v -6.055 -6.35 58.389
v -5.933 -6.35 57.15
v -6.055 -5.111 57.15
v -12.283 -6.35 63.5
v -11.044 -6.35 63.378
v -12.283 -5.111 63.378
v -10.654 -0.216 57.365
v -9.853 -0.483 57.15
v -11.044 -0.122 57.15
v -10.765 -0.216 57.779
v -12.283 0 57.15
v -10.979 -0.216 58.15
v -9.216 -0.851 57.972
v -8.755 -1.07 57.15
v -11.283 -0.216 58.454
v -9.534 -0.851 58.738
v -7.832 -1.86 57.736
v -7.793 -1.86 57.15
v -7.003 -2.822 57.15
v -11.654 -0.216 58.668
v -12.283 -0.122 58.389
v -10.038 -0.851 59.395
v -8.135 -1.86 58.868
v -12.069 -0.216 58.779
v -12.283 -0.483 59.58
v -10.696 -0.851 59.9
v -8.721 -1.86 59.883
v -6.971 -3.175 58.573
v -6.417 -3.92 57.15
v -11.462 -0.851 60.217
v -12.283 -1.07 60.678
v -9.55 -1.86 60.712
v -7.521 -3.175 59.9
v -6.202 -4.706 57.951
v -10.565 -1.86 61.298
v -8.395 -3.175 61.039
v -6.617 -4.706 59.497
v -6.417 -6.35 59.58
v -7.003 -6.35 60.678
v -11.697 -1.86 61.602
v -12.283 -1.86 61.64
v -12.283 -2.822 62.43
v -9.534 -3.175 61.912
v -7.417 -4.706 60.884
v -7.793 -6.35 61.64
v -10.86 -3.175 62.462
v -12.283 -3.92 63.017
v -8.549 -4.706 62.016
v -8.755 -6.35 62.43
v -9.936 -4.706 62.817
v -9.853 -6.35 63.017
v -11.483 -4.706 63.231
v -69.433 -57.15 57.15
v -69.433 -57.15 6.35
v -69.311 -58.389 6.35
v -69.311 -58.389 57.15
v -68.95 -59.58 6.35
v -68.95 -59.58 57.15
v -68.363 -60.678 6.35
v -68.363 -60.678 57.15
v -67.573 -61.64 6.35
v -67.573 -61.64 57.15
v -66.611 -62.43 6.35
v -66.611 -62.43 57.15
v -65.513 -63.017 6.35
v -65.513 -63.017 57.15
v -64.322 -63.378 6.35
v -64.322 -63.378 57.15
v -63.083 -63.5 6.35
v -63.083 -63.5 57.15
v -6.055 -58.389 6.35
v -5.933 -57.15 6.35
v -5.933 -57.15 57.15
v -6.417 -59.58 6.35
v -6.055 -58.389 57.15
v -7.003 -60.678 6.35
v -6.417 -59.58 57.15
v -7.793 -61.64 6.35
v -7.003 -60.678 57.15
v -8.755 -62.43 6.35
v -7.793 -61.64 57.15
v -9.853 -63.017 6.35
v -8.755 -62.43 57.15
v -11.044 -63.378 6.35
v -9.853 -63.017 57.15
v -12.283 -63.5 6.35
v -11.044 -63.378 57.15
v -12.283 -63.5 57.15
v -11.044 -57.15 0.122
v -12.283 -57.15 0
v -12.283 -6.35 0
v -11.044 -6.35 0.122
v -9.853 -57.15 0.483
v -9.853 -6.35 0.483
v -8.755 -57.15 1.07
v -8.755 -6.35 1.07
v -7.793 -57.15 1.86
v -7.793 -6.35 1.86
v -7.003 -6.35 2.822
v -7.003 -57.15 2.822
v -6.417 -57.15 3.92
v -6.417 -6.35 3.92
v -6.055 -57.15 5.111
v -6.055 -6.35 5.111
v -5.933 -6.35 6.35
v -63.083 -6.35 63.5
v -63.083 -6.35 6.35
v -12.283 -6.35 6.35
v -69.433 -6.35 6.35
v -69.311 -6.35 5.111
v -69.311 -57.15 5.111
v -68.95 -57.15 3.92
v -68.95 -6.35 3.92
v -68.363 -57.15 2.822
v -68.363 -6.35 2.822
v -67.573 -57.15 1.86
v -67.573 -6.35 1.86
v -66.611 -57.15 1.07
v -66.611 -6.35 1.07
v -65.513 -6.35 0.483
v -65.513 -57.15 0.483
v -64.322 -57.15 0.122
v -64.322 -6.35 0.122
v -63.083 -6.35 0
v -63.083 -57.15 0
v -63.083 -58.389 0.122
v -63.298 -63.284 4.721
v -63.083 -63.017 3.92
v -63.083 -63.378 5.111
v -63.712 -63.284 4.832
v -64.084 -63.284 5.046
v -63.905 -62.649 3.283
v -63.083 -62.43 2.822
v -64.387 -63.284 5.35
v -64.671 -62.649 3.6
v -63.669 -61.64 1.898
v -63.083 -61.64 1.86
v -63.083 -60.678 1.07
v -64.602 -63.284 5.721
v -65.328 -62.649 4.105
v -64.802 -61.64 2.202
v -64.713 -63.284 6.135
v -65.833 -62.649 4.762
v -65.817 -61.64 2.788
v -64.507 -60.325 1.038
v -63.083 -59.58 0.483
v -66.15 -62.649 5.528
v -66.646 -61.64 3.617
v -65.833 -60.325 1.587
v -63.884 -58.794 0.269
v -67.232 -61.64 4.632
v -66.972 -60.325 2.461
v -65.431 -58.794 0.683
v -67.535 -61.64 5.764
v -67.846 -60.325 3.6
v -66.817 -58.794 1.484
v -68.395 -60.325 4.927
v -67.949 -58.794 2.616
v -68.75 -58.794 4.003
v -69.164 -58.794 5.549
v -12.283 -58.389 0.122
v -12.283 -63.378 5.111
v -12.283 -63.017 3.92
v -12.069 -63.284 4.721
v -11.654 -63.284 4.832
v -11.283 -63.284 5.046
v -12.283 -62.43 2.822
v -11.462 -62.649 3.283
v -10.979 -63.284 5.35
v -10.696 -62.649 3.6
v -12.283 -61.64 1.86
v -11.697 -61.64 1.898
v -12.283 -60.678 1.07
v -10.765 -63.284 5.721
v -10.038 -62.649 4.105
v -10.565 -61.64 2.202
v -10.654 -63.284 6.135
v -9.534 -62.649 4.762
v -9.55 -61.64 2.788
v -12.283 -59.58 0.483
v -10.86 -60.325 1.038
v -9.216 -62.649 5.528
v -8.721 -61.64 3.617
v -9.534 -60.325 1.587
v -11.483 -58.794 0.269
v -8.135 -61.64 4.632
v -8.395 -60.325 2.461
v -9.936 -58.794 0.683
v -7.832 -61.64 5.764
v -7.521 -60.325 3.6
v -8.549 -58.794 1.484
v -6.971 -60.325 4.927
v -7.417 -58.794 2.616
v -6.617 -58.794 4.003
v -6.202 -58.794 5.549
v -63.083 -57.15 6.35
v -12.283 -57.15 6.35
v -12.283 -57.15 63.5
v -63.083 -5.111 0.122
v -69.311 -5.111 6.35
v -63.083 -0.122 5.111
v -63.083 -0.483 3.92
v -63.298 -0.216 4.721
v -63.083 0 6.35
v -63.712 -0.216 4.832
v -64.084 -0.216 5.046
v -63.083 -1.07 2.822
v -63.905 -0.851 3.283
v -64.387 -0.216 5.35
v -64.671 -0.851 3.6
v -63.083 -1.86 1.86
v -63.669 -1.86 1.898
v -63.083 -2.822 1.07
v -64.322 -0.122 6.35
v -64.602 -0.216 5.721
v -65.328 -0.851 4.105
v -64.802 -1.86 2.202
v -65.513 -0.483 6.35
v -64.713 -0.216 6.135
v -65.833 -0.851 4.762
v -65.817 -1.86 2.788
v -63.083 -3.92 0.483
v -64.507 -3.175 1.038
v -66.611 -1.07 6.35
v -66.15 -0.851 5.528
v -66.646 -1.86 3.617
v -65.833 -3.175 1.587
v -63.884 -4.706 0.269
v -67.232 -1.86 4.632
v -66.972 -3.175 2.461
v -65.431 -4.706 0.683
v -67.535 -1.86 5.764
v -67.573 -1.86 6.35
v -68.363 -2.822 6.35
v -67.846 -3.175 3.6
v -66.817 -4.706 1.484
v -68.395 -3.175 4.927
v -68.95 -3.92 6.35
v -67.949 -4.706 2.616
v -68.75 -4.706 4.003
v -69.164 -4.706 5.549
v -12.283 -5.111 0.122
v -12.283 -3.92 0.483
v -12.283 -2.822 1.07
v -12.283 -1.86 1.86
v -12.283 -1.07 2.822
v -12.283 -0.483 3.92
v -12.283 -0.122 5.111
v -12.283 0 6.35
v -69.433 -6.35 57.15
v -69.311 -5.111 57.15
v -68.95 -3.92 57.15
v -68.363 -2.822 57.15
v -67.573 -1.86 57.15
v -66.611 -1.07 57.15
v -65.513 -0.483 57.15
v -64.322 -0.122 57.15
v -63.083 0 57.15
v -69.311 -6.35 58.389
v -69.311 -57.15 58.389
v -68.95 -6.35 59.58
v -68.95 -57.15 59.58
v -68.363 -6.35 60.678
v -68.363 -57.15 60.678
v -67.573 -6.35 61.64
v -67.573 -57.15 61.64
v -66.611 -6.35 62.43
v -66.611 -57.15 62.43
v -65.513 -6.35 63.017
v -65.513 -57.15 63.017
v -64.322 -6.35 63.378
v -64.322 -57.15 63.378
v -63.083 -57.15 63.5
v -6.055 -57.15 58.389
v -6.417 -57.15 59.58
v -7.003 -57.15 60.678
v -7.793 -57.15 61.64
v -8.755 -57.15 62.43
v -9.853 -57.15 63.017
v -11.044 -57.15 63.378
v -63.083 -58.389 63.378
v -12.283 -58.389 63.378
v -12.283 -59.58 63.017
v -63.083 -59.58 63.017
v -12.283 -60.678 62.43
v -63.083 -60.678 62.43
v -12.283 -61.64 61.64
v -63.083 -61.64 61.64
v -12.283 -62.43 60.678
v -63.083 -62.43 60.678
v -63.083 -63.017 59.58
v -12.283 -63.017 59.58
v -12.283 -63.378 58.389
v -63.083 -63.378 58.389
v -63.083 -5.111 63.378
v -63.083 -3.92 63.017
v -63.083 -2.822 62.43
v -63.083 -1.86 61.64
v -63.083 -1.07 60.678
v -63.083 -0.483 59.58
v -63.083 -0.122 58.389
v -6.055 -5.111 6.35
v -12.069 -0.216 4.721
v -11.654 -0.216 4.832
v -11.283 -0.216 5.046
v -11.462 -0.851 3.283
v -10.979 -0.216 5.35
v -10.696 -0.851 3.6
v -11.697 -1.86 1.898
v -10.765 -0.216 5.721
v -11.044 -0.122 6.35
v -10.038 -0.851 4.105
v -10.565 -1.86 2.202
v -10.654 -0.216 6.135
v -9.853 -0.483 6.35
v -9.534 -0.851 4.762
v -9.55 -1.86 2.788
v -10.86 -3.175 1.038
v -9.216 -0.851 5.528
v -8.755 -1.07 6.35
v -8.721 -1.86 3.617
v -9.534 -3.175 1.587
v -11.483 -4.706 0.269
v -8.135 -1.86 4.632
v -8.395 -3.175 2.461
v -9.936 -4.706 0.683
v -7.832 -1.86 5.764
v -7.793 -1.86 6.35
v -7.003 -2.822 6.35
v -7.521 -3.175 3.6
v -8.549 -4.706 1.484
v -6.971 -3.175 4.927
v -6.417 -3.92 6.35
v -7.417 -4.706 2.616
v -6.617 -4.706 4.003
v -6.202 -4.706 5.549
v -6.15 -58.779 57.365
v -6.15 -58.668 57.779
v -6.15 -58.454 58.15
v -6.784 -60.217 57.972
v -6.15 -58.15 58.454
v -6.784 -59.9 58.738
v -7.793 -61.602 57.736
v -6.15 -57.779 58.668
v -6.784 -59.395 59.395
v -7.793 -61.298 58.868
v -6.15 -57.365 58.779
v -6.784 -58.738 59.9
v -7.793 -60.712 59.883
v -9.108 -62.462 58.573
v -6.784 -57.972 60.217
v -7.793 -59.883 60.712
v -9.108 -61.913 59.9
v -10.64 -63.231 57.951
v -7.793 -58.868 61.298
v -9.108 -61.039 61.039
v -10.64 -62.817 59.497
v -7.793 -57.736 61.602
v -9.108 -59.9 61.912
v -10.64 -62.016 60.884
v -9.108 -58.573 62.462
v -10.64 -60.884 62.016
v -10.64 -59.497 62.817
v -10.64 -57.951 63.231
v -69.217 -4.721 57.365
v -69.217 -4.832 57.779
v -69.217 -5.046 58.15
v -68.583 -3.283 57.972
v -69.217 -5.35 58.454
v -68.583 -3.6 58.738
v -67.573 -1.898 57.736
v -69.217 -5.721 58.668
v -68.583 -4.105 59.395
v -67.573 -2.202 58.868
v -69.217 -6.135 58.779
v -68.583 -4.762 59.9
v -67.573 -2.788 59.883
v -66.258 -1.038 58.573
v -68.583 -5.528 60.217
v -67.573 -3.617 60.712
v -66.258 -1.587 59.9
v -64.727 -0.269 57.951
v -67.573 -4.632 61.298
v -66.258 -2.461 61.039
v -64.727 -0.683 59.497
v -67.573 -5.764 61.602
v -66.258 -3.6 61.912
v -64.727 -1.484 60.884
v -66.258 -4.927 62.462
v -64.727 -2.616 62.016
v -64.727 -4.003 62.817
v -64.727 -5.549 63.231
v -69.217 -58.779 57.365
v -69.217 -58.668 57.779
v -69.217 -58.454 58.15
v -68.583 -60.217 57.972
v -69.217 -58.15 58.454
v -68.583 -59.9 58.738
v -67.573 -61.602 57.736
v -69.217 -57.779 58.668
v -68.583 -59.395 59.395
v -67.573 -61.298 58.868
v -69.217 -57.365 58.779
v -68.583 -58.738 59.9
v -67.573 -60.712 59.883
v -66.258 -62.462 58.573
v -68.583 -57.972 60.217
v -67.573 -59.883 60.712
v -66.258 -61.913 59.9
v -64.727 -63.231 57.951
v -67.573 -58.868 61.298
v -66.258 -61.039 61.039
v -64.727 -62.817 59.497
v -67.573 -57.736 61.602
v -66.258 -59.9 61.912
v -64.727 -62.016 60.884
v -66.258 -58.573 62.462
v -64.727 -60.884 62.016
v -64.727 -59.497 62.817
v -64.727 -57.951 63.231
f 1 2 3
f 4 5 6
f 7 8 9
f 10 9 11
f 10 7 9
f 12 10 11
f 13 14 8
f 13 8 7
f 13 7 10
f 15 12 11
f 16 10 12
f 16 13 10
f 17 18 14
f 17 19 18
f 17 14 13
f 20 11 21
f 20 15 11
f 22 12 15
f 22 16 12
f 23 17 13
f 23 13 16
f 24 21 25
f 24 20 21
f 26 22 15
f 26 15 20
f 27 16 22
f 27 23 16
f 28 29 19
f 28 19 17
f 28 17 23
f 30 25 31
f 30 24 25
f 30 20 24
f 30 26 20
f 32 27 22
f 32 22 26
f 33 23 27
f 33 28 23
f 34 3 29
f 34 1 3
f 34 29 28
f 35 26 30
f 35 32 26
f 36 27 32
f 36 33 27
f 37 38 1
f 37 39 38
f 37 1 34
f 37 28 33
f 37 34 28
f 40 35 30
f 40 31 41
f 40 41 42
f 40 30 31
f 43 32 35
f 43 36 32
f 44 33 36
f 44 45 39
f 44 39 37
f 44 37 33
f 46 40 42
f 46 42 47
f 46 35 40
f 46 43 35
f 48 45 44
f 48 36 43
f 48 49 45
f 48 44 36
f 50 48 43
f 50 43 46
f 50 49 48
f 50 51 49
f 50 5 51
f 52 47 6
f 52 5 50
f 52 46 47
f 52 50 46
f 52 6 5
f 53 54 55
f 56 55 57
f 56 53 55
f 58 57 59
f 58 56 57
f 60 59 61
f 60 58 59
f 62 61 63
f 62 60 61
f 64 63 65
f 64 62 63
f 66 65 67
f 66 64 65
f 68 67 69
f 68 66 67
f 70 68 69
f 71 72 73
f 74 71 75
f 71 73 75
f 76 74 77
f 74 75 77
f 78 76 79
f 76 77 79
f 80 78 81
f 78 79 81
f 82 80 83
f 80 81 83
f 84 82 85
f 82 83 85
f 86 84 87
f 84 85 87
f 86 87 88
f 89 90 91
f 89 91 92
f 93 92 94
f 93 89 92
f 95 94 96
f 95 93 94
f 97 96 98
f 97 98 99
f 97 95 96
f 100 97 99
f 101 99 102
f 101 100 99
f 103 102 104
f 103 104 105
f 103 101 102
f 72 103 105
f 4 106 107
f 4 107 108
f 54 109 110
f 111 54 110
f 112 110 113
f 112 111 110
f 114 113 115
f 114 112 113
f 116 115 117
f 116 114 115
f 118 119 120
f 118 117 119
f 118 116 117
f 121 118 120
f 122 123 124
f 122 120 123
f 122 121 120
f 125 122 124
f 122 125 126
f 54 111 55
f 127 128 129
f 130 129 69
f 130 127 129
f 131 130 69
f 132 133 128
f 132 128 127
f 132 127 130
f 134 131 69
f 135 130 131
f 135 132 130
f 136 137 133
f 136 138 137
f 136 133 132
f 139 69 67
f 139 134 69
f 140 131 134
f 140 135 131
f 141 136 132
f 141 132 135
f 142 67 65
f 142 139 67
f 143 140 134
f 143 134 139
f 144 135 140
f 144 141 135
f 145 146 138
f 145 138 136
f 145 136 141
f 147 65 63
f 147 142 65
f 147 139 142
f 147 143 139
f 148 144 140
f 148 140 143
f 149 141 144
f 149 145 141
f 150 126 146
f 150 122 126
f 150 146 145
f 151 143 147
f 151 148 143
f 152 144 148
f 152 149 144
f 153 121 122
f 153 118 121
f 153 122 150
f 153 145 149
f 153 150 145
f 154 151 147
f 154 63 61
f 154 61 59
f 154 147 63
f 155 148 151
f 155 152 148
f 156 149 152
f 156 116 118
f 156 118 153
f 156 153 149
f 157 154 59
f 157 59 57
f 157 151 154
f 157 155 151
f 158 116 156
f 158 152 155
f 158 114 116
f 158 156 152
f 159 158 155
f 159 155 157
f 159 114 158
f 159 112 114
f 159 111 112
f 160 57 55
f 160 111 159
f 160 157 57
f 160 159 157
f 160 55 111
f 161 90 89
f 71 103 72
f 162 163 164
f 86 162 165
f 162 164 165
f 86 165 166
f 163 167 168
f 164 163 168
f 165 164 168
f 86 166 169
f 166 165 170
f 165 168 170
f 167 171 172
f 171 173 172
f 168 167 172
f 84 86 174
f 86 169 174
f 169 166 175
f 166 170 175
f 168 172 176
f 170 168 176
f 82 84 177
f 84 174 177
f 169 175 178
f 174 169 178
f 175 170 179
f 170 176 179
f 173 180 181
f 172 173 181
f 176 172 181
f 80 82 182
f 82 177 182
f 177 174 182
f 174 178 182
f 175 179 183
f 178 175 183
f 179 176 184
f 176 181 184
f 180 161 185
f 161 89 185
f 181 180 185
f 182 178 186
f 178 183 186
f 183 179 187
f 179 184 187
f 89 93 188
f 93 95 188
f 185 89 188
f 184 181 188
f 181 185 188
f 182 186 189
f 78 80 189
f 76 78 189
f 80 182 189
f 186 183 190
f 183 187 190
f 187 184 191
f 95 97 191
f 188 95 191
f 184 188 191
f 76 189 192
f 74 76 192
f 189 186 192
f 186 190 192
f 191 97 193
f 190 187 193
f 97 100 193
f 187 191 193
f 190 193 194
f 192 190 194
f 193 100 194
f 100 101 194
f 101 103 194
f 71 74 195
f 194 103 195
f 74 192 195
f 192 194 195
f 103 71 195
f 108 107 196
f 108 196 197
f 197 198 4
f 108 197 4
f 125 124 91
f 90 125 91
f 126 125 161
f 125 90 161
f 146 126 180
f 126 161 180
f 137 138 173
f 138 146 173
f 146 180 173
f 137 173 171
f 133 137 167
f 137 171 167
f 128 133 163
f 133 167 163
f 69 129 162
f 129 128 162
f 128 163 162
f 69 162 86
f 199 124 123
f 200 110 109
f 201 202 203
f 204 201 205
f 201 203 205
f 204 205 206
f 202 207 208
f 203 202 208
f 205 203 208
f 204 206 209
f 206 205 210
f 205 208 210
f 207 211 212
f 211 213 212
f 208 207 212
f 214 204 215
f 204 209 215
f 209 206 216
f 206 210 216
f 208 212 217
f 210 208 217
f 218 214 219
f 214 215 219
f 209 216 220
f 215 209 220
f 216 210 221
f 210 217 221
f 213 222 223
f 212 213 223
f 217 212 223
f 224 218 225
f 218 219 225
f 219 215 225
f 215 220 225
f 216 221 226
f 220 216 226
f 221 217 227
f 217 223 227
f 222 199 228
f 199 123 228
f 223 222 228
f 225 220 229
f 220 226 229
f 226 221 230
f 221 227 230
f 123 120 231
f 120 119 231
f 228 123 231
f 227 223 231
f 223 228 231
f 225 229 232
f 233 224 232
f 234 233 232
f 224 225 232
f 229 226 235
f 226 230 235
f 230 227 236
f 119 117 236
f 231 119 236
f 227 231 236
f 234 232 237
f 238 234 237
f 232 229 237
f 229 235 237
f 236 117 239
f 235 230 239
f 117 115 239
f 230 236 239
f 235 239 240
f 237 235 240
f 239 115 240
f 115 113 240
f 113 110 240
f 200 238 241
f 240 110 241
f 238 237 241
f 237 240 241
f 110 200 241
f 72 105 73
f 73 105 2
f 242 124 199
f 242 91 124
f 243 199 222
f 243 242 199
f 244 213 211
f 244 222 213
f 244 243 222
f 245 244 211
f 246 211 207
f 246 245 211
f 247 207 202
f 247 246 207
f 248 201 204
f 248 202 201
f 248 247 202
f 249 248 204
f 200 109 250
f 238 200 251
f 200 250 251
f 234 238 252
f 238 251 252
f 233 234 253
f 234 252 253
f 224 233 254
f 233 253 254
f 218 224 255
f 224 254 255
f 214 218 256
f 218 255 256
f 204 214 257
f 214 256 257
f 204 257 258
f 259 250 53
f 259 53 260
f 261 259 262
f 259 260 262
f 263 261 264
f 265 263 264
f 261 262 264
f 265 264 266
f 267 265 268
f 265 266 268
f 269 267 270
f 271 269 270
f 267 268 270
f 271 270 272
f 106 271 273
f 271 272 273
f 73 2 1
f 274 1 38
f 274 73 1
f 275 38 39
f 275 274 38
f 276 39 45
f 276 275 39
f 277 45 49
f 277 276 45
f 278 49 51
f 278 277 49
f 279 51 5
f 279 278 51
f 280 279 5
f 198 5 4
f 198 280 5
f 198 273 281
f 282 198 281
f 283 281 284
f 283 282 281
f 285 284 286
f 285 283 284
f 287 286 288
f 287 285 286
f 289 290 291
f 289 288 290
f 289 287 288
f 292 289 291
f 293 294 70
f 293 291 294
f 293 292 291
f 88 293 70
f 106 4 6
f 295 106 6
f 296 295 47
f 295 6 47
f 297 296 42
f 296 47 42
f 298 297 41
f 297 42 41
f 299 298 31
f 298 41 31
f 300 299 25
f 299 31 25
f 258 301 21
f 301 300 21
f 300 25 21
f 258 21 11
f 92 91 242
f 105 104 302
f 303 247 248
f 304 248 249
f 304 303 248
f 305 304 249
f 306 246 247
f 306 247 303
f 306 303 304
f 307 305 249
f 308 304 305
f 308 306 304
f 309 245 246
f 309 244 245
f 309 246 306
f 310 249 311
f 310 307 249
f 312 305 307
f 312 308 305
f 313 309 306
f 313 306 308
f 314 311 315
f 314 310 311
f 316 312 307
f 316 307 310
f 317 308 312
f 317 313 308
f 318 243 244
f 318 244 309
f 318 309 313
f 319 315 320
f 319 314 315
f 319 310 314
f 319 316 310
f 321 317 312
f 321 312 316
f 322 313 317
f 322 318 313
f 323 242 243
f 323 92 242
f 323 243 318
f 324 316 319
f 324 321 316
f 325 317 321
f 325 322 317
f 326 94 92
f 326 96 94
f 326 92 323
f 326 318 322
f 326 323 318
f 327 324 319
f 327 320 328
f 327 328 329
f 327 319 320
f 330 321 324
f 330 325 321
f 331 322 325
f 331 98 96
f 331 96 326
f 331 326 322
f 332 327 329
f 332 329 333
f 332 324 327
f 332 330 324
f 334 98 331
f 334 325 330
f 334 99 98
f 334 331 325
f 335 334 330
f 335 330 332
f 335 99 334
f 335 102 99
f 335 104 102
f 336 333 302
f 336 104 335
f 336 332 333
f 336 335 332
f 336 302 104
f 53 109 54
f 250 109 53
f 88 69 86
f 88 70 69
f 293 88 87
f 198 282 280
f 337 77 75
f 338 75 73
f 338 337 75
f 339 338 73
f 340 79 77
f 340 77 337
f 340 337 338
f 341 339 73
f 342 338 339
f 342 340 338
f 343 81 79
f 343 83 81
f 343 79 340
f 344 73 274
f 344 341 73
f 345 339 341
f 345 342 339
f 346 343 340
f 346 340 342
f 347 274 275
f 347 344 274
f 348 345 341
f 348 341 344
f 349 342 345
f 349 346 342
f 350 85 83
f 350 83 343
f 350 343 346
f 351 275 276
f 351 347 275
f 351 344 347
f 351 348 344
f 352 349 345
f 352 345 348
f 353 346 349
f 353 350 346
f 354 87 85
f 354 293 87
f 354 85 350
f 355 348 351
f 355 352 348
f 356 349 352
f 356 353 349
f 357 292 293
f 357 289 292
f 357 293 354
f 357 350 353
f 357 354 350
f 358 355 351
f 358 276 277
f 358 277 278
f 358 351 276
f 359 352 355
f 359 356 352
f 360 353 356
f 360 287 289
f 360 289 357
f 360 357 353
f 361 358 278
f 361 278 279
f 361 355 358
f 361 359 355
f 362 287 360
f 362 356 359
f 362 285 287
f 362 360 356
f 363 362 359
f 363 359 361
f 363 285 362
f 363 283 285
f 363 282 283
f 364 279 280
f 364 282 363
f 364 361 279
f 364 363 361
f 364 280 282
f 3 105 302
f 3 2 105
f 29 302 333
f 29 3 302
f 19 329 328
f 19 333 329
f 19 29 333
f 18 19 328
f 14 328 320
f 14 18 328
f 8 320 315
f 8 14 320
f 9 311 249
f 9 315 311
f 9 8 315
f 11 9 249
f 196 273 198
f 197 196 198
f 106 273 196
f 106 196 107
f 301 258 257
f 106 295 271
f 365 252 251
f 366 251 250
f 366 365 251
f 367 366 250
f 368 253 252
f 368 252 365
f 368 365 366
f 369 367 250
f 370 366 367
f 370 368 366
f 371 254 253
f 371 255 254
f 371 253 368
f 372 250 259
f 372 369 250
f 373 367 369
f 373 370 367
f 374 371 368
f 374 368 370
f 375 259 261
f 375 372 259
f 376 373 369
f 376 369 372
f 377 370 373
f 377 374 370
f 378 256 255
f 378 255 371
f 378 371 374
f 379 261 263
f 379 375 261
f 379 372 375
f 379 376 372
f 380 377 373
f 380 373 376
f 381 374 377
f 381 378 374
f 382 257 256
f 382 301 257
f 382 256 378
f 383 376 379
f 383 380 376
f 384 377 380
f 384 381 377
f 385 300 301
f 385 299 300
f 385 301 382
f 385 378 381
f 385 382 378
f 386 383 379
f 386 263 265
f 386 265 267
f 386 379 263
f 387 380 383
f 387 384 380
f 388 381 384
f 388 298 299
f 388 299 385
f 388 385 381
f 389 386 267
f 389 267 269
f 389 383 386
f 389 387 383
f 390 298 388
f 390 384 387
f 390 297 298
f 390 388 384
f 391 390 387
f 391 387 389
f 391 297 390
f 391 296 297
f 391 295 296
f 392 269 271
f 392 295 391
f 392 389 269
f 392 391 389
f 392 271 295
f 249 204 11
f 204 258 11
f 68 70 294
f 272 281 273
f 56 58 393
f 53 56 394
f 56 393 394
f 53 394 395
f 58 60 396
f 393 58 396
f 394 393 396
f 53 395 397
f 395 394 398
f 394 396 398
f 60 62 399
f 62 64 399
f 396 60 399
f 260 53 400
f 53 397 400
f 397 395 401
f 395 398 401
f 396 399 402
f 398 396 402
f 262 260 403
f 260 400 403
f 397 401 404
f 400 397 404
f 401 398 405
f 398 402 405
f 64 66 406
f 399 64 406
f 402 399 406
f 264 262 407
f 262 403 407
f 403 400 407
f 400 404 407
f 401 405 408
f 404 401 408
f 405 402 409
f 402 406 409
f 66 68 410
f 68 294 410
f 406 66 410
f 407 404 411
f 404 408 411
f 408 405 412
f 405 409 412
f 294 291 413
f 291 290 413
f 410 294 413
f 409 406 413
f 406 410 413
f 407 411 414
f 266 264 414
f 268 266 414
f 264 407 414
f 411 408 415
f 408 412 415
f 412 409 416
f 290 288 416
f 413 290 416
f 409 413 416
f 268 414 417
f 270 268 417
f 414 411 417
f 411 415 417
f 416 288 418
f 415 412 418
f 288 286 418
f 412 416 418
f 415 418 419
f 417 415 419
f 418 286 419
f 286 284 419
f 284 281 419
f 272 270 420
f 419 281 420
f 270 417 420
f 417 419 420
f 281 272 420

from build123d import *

# Parameters (mm, degrees)
F0_W     = 63.5
F0_H     = 63.5
F1_DEPTH = 63.5
F2_R     = 6.35
F3_W     = 50.8
F3_H     = 50.8
F4_DEPTH = 57.15


with BuildPart() as f1:
    # F0 (on Front) → F1 (new body)
    with BuildSketch(Plane.XZ):
        with Locations((-37.683266, 31.75)):
            Rectangle(F0_W, F0_H)
    extrude(amount=F1_DEPTH)

    # F2
    f2_edges = [f1.edges().sort_by_distance(p)[0] for p in [
        (-69.433266, -31.75, 0),
        (-5.933266, -31.75, 0),
        (-37.683266, 0, 0),
        (-37.683266, -63.5, 0),
        (-37.683266, -63.5, 63.5),
        (-69.433266, -63.5, 31.75),
        (-5.933266, -63.5, 31.75),
        (-5.933266, -31.75, 63.5),
        (-5.933266, 0, 31.75),
        (-37.683266, 0, 63.5),
        (-69.433266, 0, 31.75),
        (-69.433266, -31.75, 63.5),
    ]]
    fillet(f2_edges, radius=F2_R)

    # F3 (on face) → F4 (cut)
    with BuildSketch(Plane.XY.offset(63.5)):
        with Locations((-37.683266, -31.75)):
            Rectangle(F3_W, F3_H)
    extrude(amount=-F4_DEPTH, mode=Mode.SUBTRACT)


solid = f1.part
